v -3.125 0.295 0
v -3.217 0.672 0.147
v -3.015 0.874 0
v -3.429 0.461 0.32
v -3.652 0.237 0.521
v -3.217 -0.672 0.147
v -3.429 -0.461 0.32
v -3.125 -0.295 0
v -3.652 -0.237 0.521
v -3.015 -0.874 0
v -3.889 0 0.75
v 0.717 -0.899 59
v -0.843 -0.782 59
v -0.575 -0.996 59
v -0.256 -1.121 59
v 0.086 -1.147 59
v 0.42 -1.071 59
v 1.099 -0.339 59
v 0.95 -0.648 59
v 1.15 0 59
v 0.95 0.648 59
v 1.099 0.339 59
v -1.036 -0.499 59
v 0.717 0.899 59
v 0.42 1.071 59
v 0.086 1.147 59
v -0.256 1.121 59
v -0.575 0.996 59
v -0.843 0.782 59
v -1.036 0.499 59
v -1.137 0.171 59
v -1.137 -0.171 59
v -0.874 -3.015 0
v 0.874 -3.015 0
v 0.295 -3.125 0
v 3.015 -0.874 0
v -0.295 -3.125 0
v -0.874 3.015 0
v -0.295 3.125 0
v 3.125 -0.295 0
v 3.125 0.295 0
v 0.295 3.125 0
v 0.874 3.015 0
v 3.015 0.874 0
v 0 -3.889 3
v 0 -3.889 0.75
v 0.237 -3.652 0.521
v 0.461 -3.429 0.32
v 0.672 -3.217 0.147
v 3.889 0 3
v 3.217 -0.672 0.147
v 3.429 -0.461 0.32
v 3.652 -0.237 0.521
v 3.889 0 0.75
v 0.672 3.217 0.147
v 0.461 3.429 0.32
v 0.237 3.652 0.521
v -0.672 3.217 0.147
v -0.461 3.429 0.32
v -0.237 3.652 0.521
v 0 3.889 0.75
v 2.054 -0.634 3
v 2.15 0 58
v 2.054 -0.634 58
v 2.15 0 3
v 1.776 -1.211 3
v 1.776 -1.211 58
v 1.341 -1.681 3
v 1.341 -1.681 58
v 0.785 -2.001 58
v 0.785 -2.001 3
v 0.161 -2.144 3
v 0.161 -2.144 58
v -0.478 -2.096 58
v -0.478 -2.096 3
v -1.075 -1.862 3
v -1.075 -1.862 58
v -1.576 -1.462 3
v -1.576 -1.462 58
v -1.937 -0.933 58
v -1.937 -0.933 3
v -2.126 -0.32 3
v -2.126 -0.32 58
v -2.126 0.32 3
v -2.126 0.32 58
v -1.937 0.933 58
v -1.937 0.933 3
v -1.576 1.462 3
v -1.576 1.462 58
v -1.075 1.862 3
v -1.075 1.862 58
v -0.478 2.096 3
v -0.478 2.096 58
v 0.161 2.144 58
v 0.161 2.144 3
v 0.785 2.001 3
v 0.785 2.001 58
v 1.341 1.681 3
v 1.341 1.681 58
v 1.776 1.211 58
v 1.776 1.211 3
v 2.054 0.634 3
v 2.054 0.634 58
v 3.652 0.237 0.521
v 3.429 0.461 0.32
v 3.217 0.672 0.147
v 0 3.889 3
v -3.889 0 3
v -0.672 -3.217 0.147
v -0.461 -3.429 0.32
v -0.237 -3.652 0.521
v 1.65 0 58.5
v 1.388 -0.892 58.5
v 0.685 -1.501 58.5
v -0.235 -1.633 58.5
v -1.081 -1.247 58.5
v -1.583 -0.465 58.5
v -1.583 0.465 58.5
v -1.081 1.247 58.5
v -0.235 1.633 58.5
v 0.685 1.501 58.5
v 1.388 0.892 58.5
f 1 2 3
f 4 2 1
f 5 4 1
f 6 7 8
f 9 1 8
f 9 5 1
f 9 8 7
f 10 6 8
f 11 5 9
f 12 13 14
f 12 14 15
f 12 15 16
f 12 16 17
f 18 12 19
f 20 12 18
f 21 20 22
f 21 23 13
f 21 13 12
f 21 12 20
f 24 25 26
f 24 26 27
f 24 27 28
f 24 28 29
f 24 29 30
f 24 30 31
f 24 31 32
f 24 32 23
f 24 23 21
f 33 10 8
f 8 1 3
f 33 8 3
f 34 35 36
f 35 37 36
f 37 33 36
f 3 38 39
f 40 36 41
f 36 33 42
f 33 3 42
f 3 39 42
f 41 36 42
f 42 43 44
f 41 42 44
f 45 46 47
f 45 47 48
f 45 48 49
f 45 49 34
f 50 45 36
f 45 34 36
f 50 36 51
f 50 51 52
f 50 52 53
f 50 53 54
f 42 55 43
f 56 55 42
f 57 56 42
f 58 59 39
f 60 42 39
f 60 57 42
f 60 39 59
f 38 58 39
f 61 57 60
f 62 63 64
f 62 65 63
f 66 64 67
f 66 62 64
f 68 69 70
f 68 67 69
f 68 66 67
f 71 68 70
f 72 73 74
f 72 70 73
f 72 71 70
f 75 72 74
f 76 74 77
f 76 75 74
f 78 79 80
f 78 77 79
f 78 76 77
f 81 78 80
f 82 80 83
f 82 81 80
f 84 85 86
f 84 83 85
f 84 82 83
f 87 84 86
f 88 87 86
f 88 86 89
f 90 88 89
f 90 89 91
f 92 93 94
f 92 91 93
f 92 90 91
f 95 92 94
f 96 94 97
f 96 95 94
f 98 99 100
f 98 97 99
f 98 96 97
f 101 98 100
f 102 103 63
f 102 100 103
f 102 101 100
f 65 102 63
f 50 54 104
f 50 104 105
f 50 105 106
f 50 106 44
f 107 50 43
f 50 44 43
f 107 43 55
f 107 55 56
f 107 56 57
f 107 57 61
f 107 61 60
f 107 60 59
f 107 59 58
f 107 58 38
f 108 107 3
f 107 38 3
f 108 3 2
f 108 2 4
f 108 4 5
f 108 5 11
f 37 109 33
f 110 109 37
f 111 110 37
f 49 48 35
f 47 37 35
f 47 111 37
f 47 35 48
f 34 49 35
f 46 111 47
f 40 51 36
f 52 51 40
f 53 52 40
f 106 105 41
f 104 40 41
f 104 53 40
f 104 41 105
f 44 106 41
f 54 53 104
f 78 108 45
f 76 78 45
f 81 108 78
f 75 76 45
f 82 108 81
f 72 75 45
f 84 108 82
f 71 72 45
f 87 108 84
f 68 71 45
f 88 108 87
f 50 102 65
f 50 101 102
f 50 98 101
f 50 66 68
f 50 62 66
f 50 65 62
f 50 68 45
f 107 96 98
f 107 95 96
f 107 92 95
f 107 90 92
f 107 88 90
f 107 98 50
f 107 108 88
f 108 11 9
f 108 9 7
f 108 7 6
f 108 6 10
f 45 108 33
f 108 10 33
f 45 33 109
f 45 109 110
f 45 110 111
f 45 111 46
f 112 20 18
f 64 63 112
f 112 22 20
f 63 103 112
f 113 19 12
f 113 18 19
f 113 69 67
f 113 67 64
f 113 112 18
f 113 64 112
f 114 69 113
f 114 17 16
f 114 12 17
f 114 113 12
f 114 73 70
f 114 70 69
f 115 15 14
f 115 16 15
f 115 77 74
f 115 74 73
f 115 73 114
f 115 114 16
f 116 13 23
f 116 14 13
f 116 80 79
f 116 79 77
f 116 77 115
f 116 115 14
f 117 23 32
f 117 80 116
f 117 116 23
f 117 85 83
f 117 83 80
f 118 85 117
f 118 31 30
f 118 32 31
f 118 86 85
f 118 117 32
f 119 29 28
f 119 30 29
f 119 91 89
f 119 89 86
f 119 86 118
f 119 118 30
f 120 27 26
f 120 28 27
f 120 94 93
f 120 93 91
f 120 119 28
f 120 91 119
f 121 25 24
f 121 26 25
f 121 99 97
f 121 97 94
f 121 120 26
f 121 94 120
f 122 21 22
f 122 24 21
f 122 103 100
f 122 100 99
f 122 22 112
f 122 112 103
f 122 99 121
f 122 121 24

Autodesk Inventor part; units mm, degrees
ref_plane "YZ Plane" through (0, 0, 0) normal (1, 0, 0) x (0, 1, 0)
ref_plane "XZ Plane" through (0, 0, 0) normal (0, 1, 0) x (-1, 0, 0)
ref_plane "XY Plane" through (0, 0, 0) normal (0, 0, 1) x (1, 0, 0)
sketch "Sketch1" plane through (0, 0, 0) normal (0, 0, 1) x (1, 0, 0)
  line L0 (-3.8891, 0) -> (0, -3.8891)
  line L1 (0, -3.8891) -> (3.8891, 0)
  line L2 (3.8891, 0) -> (0, 3.8891)
  line L3 (0, 3.8891) -> (-3.8891, 0)
  line L4 (-3.8891, 0) -> (3.8891, 0) construction
  line L5 (0, -3.8891) -> (0, 3.8891) construction
  point P0 (0, 0)
  dimension "d0" = 5.5
  dimension "d1" = 5.5
  dimension "d2" = 90
  dimension "d3" = 5.5
  dimension "d4" = 90
  dimension "d5" = 0
  dimension "d6" = 0
extrude "Extrusion1" add sketch "Sketch1" along normal blind 3
sketch "Sketch2" plane through (0, 0, 0) normal (1, 0, 0) x (0, 1, 0)
  line L0 (3.8891, 0) -> (0, 0) projected
  line L1 (3.8891, 0) -> (3.8891, 0.75)
  line L2 (3.8891, 0.75) -> (3.1391, 0)
  line L3 (3.8891, 0) -> (3.1391, 0)
  line L4 (-3.8891, 3) -> (0, 3) projected
  line L5 (0, 3) -> (0, 0)
  dimension "d9" = 0.75
  dimension "d10" = 0.75
revolve "Revolution1" cut sketch "Sketch2" angle 360 about axis through (0, 0, 3) along (0, 0, -1)
sketch "Sketch3" plane through (0, 0, 3) normal (0, 0, 1) x (1, 0, 0)
  circle A0 centre (0, 0) radius 2.15
  dimension "d12" = 4.3
extrude "Extrusion2" add sketch "Sketch3" along normal blind 56
chamfer "Chamfer1" distance 1 angle 45 1 edges at (-2.15, 0, 59)
thread "Thread1" size "M4.5x0.75" class "6g" standard "ANSI Metric M Profile" length 5
properties part number "ES117_Bolt" material "Stainless Steel"
